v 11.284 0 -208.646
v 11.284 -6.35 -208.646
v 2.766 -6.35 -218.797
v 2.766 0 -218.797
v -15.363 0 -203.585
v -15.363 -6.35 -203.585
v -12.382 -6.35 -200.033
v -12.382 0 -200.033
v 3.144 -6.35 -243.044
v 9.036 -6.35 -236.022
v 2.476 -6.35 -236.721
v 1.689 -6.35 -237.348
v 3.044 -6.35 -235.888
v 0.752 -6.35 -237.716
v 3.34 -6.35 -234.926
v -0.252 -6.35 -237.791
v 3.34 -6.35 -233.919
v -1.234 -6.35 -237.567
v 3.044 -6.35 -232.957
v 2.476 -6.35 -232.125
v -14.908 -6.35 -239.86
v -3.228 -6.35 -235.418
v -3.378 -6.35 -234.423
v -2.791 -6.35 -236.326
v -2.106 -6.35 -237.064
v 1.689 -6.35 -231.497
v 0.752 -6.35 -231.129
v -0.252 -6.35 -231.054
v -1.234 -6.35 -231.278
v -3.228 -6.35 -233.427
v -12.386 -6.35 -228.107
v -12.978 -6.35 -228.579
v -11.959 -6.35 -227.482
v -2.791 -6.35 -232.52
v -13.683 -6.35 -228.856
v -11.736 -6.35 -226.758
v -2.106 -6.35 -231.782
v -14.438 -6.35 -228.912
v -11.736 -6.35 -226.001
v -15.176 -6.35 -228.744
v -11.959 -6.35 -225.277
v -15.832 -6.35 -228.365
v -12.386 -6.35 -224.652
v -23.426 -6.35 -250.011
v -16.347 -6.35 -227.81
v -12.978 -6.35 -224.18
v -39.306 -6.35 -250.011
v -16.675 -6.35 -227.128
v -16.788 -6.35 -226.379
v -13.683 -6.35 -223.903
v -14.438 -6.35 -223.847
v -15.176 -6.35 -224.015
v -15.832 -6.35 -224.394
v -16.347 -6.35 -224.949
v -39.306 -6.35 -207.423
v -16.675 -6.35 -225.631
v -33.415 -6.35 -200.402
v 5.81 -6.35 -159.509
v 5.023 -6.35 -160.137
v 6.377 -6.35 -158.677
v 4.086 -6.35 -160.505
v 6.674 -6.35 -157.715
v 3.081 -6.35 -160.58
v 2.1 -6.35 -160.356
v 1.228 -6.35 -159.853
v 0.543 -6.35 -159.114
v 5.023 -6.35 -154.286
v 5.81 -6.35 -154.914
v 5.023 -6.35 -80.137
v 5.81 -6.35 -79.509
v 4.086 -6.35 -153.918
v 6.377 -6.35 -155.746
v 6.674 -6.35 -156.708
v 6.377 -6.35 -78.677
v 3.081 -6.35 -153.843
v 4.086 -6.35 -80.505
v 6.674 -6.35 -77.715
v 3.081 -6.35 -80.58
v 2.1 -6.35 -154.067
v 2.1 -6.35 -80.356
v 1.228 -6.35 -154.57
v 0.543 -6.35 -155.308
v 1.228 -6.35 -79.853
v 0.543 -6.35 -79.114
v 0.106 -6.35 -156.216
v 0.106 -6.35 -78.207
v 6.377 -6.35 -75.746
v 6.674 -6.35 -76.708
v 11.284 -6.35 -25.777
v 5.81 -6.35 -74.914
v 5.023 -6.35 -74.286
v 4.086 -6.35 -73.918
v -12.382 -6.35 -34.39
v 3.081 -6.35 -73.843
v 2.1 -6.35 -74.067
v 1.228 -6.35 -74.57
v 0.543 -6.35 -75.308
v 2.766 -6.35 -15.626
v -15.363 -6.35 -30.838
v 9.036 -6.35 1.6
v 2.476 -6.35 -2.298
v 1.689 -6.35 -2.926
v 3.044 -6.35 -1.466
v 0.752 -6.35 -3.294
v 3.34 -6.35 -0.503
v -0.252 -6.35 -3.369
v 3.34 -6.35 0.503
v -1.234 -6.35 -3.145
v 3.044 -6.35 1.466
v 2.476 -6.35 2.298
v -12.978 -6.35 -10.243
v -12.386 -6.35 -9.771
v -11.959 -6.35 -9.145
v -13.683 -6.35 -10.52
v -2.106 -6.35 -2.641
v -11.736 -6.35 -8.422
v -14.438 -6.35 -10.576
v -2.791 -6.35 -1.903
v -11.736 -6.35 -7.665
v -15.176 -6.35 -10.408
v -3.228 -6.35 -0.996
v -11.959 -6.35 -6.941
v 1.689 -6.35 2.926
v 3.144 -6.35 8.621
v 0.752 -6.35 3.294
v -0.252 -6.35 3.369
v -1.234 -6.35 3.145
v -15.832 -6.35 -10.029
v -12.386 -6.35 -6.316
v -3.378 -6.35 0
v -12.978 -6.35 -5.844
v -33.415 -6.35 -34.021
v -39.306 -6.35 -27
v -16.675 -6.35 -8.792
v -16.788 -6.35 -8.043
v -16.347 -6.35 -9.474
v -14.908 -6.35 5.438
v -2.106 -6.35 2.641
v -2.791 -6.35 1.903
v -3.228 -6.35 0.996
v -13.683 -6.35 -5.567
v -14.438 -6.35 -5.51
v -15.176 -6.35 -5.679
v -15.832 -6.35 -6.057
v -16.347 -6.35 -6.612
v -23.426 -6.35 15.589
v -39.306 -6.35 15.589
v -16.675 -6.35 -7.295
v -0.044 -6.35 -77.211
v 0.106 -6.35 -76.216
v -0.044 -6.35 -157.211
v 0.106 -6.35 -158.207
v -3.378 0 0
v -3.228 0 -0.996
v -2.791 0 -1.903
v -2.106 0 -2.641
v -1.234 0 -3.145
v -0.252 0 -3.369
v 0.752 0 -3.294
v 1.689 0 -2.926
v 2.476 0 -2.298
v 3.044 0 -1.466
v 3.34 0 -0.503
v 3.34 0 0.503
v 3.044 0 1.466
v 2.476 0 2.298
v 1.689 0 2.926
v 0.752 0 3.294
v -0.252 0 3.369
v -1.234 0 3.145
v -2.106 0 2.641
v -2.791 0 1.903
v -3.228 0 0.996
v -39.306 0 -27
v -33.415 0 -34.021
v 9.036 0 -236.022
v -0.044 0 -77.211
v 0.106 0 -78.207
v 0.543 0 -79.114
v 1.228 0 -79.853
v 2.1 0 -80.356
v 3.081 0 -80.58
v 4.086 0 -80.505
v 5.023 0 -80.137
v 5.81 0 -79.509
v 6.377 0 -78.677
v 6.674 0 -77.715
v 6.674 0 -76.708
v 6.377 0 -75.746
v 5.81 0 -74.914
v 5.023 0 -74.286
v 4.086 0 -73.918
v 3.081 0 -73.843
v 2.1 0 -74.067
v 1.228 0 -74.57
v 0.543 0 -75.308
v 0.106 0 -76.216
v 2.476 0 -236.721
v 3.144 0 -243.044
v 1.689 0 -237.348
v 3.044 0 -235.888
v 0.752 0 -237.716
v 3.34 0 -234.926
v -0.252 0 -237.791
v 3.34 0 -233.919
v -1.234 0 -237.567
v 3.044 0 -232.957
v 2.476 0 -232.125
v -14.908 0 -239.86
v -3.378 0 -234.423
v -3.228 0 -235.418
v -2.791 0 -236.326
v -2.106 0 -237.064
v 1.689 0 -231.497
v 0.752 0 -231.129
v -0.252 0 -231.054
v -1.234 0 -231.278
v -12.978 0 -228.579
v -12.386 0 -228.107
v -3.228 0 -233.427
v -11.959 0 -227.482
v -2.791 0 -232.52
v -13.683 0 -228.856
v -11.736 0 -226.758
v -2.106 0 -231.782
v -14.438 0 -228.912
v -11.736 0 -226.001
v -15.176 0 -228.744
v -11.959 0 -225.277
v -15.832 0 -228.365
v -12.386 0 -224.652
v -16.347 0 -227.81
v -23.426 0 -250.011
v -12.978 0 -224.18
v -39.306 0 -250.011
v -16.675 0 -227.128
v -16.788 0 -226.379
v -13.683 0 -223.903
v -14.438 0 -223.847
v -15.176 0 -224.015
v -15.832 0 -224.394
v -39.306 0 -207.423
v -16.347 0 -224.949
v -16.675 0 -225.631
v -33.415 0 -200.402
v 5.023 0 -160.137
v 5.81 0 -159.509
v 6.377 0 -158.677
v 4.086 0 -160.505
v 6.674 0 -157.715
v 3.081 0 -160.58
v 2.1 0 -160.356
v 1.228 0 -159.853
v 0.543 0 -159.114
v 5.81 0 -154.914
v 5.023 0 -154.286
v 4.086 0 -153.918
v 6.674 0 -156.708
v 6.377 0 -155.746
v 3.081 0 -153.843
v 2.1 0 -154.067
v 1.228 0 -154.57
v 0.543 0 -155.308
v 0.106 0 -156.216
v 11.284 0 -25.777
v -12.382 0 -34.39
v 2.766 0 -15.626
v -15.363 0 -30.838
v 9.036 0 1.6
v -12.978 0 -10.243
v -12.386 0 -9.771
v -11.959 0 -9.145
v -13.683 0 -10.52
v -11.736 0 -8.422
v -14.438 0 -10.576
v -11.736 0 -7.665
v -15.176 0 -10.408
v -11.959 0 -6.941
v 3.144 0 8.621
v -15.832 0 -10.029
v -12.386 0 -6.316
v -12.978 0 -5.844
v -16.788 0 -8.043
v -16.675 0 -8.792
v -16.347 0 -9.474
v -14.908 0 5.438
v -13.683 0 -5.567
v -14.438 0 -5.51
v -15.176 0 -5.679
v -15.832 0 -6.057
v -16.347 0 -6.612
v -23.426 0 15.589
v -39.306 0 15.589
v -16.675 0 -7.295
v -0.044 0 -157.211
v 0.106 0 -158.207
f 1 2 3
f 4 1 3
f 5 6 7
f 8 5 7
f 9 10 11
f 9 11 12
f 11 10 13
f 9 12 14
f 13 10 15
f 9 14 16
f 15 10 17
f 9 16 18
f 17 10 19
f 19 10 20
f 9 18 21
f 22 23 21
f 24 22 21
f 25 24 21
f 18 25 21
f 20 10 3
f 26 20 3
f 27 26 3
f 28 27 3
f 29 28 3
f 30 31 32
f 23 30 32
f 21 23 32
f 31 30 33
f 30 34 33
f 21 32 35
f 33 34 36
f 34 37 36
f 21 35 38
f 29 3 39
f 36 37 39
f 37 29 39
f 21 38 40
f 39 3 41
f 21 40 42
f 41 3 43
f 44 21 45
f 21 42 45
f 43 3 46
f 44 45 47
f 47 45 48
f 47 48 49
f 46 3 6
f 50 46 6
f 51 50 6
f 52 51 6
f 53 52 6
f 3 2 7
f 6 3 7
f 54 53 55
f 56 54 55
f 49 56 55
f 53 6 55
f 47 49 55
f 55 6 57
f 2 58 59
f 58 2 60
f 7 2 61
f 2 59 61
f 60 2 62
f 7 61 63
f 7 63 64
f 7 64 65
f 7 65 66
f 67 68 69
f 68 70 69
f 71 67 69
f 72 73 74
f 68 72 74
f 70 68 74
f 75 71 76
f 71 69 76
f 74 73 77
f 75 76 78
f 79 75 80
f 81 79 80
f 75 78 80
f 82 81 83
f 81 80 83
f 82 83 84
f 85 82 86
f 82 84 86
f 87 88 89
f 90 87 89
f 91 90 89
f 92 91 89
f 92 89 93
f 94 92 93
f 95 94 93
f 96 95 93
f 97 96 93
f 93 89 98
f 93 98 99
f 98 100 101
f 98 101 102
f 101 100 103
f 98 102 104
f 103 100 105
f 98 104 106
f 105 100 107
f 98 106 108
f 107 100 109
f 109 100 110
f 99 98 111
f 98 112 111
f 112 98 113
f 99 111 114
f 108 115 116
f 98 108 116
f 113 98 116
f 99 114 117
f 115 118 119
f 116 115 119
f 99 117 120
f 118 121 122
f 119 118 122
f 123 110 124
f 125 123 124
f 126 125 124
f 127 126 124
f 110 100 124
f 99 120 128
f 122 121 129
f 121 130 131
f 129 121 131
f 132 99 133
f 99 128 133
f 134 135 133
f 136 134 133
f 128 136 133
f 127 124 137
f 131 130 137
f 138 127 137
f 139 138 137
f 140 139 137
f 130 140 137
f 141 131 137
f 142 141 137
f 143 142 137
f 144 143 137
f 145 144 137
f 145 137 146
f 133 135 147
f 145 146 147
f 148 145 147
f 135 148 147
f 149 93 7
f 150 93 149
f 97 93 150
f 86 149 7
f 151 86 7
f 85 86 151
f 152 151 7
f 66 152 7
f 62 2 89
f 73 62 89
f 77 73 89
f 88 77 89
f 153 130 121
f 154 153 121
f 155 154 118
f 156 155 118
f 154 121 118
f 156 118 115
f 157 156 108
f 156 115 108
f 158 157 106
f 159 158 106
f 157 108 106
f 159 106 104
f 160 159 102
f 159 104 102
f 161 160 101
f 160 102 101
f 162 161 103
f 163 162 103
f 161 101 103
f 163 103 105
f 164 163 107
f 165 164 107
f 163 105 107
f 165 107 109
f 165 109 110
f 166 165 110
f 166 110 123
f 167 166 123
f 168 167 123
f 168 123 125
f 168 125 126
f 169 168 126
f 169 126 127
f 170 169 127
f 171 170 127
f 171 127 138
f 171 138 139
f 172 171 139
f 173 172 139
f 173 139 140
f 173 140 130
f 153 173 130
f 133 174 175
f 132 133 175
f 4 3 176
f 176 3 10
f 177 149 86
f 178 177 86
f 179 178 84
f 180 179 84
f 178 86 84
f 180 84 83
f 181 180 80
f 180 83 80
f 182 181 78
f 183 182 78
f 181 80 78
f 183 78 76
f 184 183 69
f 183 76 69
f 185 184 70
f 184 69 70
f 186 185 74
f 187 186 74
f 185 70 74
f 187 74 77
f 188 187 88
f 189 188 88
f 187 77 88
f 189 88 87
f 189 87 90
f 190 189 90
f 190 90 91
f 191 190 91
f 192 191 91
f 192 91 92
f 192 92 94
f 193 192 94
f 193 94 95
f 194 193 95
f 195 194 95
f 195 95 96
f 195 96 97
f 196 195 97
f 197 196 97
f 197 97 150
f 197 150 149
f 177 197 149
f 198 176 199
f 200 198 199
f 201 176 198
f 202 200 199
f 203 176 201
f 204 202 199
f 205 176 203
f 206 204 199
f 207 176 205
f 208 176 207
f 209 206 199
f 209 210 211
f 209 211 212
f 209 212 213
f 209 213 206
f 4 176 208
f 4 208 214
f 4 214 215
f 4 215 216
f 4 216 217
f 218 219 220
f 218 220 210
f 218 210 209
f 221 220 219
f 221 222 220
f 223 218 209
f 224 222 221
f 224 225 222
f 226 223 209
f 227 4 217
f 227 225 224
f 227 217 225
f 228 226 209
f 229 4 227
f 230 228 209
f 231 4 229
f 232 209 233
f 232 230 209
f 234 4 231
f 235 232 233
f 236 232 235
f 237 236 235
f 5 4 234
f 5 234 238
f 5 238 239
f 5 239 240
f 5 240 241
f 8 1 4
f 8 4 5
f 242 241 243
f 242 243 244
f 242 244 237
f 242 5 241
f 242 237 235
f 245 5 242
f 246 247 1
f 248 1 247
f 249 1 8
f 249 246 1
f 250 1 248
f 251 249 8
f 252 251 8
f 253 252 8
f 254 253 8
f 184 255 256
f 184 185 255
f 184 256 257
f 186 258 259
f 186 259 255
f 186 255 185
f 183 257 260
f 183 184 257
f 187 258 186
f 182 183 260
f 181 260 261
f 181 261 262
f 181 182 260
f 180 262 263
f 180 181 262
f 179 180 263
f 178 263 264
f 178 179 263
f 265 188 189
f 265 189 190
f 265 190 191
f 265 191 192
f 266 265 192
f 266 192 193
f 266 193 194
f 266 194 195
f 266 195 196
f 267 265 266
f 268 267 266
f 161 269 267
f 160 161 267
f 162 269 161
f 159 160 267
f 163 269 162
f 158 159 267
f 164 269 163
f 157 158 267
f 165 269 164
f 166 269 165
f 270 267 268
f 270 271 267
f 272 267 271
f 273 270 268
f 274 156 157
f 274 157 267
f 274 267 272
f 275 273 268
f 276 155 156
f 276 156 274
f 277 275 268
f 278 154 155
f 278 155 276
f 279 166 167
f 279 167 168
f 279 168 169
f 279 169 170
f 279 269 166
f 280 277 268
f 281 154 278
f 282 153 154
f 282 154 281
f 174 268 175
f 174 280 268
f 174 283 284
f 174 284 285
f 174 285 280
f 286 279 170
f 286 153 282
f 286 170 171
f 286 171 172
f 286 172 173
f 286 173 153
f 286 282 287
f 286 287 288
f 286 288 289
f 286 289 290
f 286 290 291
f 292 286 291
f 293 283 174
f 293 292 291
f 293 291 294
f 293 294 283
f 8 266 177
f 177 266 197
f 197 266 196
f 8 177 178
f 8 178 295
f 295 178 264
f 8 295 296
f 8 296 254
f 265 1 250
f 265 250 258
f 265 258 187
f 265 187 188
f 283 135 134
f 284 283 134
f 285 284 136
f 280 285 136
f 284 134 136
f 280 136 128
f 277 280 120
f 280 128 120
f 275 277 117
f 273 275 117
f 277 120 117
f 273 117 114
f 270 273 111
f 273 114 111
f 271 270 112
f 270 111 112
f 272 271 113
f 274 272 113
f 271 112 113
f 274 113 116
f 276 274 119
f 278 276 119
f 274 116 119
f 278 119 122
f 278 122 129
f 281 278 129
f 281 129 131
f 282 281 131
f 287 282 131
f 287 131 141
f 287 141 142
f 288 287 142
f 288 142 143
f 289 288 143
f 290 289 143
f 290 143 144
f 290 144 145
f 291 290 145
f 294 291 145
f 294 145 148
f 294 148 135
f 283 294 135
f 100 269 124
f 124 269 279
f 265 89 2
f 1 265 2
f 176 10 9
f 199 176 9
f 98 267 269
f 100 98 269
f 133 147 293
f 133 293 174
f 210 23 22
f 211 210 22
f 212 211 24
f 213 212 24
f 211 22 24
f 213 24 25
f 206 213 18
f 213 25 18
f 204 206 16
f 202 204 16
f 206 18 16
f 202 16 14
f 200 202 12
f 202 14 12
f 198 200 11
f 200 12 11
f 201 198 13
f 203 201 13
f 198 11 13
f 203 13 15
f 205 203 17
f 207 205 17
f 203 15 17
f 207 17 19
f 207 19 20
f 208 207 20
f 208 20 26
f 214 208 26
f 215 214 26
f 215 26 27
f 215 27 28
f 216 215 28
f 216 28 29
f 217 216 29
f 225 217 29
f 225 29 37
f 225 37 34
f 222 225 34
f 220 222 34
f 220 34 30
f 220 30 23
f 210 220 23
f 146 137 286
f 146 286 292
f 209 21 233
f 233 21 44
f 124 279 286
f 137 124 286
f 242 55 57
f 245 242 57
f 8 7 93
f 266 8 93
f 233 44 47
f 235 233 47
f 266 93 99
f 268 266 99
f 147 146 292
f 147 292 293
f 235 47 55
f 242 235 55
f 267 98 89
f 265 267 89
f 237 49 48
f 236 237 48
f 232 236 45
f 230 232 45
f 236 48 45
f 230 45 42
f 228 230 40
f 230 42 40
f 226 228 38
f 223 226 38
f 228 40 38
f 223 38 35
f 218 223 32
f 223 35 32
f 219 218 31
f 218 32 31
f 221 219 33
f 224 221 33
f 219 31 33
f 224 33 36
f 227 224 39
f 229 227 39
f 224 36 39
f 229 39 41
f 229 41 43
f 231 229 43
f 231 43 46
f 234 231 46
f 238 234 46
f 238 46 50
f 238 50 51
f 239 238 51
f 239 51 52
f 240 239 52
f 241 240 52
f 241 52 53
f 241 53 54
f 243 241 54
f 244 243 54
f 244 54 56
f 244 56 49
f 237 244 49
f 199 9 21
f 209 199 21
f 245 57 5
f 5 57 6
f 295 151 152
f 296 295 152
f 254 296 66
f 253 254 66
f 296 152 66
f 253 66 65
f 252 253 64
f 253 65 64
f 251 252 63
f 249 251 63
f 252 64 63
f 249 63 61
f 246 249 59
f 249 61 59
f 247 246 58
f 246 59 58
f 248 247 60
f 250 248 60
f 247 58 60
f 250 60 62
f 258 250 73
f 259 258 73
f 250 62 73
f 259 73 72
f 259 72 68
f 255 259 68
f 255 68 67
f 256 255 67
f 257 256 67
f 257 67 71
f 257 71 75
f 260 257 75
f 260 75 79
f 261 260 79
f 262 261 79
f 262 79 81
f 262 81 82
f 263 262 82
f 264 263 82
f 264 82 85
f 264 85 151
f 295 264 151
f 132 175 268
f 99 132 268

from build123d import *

# Parameters (mm, degrees)
BOSS_EXTRUDE1_DEPTH         = 6.35
BOSS_EXTRUDE3_DEPTH         = 6.35
F_1_4_CLEARANCE_HOLE1_D     = 6.7564
TAP_DRILL_FOR_1_4_20_TAP1_D = 5.08
BOSS_EXTRUDE4_DEPTH         = 6.35


with BuildPart() as part:
    # Sketch2 → Boss-Extrude1 (new body)
    with BuildSketch(Plane(origin=(0, 0, 0), x_dir=(1, 0, 0), z_dir=(0, 1, 0))):
        Polygon((2.766393585, 15.625659676), (9.035920728, -1.599724579), (3.144492336, -8.62085553), (-14.907891591, -5.437733178), (-33.036934837, 9.774340324), (-39.306461979, 26.999724579), (-33.415033588, 34.02085553), (-15.362649661, 30.837733178), align=None)
    extrude(amount=-BOSS_EXTRUDE1_DEPTH)

    # Sketch7 → Boss-Extrude3 (add)
    with BuildSketch(Plane.XZ.offset(6.35)):
        Polygon((2.766393585, -15.625659676), (11.284005931, -25.77655479), (11.284005931, -208.646188628), (2.766393585, -218.797083741), (9.035920728, -236.022467996), (3.144492336, -243.043598948), (-14.907891591, -239.860476595), (-33.036934837, -224.648403094), (-39.306461979, -207.423018839), (-33.415033588, -200.401887887), (-15.362649661, -203.58501024), (-12.381779272, -200.032547244), (-12.381779272, -34.390196174), (-15.362649661, -30.837733178), align=None)
    extrude(amount=-BOSS_EXTRUDE3_DEPTH)

    # 1/4 Clearance Hole1 (through all)
    with Locations(Plane(origin=(0, 0, 0), x_dir=(1, 0, 0), z_dir=(0, 1, 0))):
        with Locations((0, 0), (3.333805931, 77.211371709), (3.333805931, 157.211371709), (0, 234.422743417)):
            Hole(F_1_4_CLEARANCE_HOLE1_D / 2)

    # Tap Drill for 1/4-20 Tap1 (through all)
    with Locations(Plane(origin=(0, 0, 0), x_dir=(1, 0, 0), z_dir=(0, 1, 0))):
        with Locations((-14.247913361, 8.043291), (-14.247913361, 226.379452417)):
            Hole(TAP_DRILL_FOR_1_4_20_TAP1_D / 2)

    # Sketch10 → Boss-Extrude4 (add)
    with BuildSketch(Plane.XZ.offset(6.35)):
        Polygon((-14.907891591, -239.860476595), (-23.425503936, -250.011371709), (-39.306461979, -250.011371709), (-39.306461979, -207.423018839), (-33.036934837, -224.648403094), align=None)
        Polygon((-14.907891591, 5.437733178), (-23.425503936, 15.588628291), (-39.306461979, 15.588628291), (-39.306461979, -26.999724579), (-33.036934837, -9.774340324), align=None)
    extrude(amount=-BOSS_EXTRUDE4_DEPTH)


solid = part.part
